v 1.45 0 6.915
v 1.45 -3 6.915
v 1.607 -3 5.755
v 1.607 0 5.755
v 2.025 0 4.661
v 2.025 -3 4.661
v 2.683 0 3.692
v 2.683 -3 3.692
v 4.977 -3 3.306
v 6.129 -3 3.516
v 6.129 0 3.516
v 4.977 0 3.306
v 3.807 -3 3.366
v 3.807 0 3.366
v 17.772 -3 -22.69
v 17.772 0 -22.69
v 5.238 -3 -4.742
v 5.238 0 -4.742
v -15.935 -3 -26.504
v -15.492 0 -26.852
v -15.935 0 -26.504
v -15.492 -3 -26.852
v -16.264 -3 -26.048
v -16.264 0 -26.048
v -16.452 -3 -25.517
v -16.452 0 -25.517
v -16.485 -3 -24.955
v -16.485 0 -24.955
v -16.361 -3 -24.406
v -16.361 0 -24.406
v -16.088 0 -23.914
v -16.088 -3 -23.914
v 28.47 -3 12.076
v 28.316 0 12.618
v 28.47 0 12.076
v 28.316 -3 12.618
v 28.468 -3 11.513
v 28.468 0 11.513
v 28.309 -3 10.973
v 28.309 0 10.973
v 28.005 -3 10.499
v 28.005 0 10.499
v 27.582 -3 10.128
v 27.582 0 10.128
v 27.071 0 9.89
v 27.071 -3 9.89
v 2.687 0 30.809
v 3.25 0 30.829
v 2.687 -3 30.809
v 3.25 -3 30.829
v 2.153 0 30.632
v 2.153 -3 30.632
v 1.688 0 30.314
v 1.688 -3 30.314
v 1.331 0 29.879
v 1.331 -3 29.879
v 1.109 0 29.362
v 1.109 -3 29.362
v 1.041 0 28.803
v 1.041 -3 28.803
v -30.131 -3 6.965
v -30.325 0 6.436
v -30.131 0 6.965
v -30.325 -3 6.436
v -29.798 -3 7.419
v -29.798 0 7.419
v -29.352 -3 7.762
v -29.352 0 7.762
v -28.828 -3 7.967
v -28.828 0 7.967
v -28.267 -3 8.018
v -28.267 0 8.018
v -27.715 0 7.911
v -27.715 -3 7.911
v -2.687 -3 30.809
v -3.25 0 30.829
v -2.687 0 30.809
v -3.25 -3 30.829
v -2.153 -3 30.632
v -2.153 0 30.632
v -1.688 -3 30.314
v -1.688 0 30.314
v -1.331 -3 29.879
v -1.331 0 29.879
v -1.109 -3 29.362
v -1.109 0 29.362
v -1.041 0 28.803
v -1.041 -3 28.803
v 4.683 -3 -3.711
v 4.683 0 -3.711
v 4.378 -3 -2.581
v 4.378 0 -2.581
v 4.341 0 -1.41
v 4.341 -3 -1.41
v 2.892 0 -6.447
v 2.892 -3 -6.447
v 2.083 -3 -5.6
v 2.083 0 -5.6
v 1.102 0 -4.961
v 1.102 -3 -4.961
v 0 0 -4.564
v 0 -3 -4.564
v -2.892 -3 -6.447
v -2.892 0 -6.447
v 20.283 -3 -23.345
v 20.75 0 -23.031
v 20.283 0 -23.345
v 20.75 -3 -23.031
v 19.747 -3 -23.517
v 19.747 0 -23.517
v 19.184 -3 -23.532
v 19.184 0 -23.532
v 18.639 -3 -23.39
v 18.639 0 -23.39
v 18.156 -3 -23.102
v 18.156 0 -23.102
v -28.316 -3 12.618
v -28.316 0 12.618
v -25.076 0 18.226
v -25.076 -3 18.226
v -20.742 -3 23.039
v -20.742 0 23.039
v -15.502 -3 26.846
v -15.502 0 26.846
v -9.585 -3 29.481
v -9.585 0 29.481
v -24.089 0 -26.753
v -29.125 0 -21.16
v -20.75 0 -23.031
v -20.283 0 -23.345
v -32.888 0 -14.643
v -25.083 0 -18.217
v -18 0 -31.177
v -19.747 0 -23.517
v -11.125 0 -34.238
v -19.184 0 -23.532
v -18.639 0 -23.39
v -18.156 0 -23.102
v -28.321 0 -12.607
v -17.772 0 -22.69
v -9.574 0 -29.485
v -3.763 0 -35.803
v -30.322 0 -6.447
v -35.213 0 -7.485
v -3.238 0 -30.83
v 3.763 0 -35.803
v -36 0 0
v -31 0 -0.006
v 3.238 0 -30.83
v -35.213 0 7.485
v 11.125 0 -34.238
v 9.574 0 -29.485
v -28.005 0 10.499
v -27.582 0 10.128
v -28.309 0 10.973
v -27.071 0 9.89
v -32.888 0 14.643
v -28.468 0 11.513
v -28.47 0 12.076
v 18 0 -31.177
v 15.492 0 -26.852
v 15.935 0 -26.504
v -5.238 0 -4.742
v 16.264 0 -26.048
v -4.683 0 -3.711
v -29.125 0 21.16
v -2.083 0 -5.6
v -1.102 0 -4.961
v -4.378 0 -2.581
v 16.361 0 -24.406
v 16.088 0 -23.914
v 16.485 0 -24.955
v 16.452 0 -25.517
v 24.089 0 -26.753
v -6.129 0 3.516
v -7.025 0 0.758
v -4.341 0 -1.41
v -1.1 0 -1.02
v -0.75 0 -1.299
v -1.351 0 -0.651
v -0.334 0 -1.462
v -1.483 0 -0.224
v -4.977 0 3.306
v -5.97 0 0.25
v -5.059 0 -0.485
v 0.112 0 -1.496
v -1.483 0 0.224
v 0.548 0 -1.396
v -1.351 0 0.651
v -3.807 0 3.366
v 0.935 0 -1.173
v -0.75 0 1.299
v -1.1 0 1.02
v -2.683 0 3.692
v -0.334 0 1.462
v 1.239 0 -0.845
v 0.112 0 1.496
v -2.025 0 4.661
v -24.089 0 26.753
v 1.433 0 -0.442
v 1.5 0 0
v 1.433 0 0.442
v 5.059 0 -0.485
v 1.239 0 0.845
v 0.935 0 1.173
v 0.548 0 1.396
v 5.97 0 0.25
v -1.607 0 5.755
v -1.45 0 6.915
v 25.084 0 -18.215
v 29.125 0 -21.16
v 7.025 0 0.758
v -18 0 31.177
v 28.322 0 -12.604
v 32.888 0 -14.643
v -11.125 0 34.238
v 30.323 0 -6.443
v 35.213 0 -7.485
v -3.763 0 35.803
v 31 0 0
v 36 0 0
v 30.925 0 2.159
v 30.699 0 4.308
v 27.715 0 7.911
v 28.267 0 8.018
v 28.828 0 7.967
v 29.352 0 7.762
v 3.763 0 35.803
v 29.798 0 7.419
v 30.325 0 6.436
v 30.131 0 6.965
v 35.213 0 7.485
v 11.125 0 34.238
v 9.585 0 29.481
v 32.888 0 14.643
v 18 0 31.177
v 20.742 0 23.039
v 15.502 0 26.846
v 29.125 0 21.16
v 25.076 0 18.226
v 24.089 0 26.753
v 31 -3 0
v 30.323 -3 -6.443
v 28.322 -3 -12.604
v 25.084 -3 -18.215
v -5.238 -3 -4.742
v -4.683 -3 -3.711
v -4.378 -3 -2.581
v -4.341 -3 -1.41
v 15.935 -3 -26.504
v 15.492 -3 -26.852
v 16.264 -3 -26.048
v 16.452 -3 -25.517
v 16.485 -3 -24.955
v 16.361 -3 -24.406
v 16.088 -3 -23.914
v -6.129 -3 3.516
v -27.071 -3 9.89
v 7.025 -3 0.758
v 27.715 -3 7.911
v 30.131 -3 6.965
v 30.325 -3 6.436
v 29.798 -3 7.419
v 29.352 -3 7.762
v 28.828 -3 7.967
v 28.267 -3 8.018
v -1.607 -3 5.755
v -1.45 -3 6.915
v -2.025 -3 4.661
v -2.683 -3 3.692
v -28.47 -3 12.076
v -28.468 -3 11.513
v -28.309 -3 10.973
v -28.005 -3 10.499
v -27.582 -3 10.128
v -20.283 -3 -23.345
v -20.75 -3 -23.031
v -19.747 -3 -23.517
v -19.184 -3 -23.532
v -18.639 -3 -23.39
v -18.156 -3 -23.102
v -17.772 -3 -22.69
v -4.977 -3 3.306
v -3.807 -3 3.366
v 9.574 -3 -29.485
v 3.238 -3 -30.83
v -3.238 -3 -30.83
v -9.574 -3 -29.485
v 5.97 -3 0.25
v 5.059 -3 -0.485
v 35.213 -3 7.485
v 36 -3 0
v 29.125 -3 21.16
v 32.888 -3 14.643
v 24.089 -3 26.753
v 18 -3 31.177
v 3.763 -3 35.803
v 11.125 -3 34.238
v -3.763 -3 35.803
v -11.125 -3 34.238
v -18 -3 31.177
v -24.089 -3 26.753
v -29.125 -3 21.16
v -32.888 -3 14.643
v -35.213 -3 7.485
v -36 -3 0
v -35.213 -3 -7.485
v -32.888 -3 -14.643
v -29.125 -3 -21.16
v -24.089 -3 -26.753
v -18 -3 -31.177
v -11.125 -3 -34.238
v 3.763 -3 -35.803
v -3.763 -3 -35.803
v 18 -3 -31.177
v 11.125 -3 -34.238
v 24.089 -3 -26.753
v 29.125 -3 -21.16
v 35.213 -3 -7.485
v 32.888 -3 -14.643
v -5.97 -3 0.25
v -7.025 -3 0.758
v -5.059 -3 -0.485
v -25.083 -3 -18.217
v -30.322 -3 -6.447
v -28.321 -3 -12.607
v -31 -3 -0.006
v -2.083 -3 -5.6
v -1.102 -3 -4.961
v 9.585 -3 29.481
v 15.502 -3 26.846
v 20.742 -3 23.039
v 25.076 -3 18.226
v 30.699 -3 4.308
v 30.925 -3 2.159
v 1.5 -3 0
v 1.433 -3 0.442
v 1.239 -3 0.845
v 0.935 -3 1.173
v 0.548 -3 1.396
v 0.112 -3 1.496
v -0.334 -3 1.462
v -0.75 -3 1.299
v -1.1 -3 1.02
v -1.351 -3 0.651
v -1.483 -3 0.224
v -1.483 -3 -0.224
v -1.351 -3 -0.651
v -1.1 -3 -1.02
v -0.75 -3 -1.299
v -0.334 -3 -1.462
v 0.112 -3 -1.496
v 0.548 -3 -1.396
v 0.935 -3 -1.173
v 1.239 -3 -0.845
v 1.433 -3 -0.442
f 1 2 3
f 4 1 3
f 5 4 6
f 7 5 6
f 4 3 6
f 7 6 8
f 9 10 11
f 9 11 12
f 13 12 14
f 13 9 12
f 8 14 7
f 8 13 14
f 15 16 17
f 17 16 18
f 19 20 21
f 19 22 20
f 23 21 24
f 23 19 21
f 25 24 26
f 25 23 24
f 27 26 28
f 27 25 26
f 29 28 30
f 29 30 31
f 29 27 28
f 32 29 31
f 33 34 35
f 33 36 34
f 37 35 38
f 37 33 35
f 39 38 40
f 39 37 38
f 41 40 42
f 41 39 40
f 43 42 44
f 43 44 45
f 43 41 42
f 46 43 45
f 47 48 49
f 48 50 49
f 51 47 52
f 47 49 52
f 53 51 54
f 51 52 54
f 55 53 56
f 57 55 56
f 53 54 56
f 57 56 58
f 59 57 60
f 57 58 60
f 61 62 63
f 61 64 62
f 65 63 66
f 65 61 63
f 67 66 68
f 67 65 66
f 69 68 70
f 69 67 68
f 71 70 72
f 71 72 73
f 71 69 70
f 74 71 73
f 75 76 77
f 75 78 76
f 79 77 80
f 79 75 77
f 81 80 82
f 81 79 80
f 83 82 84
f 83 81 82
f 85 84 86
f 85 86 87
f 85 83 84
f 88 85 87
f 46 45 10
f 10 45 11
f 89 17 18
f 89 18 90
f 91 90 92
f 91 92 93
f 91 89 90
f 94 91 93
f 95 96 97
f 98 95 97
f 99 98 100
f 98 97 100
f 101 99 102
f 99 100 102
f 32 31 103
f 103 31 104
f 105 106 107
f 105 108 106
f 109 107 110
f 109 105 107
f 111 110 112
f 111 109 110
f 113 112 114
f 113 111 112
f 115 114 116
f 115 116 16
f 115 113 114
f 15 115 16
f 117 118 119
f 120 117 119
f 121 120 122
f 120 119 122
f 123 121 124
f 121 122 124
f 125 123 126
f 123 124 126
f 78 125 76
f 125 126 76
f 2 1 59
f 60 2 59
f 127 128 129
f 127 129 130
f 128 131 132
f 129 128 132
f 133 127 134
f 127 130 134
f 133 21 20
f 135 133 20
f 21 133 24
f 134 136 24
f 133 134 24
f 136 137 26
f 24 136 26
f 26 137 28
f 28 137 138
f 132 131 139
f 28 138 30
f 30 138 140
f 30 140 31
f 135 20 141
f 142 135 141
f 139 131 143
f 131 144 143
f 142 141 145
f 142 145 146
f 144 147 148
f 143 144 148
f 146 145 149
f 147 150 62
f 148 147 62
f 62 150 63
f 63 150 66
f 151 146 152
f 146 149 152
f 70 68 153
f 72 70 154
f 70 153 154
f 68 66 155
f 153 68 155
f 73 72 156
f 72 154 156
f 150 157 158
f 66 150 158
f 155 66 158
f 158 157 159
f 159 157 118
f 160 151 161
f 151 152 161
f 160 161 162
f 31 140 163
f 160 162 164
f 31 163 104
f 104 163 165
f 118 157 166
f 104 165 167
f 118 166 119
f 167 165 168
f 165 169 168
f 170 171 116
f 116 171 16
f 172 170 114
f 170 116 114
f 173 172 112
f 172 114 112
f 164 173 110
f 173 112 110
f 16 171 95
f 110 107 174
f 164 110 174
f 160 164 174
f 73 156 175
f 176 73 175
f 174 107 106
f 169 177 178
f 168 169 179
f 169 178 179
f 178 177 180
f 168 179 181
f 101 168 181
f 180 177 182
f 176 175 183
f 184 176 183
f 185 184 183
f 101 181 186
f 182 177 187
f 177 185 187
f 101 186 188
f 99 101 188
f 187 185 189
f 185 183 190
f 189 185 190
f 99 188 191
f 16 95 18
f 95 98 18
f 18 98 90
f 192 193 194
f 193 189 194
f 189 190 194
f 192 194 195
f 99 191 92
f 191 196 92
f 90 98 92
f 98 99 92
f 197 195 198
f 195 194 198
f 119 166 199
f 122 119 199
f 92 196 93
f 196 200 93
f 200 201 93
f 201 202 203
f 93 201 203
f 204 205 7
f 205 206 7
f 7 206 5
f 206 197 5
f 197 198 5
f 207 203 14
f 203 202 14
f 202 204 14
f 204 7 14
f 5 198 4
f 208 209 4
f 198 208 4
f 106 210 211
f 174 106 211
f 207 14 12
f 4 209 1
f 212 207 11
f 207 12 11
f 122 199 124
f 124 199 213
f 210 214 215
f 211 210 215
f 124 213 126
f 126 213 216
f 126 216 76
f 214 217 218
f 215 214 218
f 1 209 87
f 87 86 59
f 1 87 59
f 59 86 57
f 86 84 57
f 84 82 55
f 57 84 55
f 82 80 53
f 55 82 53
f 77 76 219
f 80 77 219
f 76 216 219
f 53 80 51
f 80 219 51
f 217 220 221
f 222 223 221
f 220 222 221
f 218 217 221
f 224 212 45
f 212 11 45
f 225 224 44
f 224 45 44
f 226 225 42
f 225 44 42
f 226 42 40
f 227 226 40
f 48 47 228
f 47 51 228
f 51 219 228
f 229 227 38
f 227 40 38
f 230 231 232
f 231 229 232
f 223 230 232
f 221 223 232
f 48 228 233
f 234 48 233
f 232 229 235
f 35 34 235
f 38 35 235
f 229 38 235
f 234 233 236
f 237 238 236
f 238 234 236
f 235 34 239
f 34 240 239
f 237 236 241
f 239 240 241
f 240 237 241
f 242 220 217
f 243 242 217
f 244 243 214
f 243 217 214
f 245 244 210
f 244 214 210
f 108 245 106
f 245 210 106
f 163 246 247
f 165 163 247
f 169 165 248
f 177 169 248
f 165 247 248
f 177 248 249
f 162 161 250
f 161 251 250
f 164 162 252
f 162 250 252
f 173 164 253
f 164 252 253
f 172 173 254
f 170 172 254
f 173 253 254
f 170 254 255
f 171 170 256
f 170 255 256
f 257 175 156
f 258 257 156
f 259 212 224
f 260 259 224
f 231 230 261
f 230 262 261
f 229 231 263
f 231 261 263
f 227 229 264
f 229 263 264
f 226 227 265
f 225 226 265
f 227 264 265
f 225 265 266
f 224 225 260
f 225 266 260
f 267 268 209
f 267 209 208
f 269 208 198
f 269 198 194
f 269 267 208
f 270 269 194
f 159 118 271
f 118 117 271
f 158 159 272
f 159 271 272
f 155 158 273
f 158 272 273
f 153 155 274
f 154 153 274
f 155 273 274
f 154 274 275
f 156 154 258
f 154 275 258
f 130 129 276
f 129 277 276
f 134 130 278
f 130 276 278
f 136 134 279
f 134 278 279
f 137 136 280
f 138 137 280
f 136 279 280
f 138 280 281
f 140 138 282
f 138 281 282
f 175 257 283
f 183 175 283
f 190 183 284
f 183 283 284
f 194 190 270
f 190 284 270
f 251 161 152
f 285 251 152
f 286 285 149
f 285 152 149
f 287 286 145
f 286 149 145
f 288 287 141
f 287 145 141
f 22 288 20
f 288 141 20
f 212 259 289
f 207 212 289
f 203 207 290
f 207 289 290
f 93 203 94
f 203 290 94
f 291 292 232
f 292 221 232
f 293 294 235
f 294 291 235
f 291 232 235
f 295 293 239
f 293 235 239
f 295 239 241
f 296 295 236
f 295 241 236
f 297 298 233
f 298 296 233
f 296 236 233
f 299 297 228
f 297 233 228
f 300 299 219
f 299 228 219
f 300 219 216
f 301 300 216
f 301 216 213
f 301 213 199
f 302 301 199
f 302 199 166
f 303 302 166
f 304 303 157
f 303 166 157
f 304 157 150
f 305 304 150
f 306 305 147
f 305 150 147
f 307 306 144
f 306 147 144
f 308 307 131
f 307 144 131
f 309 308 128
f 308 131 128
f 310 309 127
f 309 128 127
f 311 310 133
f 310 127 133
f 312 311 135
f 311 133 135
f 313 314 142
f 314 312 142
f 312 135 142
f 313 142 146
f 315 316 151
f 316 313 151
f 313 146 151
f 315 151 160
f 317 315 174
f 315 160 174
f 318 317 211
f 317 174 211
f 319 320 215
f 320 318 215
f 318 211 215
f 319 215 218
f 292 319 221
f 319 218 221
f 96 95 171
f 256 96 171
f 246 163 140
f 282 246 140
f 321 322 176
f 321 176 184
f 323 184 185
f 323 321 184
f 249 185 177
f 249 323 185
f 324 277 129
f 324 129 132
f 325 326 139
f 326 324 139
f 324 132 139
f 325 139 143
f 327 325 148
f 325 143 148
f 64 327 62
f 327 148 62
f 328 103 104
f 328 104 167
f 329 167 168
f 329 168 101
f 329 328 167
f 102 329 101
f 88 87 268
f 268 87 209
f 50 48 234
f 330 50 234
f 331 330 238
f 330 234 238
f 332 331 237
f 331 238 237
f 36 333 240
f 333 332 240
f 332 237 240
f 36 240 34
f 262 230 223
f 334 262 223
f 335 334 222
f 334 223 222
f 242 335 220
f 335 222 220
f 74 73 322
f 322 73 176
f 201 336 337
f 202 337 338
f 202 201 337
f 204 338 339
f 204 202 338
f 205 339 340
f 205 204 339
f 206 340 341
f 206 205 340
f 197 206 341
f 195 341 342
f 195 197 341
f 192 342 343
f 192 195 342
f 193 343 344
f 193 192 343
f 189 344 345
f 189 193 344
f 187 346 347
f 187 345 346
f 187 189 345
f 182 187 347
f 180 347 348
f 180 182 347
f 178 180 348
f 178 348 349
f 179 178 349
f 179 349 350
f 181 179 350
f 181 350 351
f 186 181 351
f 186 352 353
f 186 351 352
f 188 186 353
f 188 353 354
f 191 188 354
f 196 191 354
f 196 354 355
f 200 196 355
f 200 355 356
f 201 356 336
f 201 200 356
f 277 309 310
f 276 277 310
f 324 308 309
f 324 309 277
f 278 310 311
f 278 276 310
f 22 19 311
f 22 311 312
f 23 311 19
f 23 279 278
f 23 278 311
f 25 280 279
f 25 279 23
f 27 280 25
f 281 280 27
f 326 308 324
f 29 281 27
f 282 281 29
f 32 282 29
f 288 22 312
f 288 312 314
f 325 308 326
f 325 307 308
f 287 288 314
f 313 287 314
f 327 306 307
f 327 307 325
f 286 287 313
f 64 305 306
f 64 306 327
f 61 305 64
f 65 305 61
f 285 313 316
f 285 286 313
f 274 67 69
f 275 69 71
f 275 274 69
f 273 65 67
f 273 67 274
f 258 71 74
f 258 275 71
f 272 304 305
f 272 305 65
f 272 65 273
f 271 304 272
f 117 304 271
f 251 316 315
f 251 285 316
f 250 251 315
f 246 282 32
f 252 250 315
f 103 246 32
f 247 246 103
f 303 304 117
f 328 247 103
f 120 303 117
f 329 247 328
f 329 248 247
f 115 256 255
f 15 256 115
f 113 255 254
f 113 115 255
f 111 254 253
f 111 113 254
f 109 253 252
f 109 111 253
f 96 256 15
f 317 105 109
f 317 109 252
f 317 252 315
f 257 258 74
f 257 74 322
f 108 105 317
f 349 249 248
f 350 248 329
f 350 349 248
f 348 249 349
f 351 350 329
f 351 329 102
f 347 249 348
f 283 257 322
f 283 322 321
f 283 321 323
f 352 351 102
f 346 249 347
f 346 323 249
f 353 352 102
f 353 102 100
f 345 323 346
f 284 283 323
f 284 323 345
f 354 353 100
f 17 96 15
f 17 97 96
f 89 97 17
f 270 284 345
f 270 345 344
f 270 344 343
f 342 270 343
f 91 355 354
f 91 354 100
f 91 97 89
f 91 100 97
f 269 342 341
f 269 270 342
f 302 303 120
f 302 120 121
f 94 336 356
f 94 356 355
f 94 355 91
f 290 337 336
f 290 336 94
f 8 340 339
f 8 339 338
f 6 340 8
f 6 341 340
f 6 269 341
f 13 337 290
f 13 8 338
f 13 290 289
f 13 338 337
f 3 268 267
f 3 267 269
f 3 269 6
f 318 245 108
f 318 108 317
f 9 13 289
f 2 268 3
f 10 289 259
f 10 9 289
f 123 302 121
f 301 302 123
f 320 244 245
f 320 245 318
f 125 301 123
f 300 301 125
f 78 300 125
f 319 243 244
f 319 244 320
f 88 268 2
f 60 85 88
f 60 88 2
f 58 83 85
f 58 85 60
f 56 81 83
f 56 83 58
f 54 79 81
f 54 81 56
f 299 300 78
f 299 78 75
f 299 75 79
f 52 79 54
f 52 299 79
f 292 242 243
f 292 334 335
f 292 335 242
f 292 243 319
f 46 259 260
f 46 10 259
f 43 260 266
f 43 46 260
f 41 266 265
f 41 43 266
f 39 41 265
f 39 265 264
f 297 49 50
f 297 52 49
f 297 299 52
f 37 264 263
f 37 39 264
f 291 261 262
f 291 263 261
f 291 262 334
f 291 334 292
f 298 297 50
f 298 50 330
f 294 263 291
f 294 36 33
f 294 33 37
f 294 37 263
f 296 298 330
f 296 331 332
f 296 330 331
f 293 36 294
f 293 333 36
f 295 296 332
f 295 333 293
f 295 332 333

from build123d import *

# Parameters (mm, degrees)
F0_R     = 36
F0_R_2   = 1.5
F1_DEPTH = 3
F2_R     = 2
F3_R     = 5.08
F4_COUNT = 5


with BuildPart() as f1:
    # F0 (on Front) → F1 (new body)
    with BuildSketch(Plane.XZ):
        Circle(F0_R)
        with BuildLine():
            ThreePointArc((-0.9998699187, 30.9838709677), (0, 31), (0.9998699187, 30.9838709677))
            ThreePointArc((0.9998699187, 30.9838709677), (22.2710121849, 21.5639054037), (31, 0))
            ThreePointArc((31, 0), (-21.5639054037, -22.2710121849), (-0.9998699187, 30.9838709677))
        make_face(mode=Mode.SUBTRACT)
        with BuildLine():
            ThreePointArc((-1.5, 4.2426406871), (0, 4.5), (1.5, 4.2426406871))
            Line((1.5, 4.2426406871), (0.9998699187, 30.9838709677))
            ThreePointArc((0.9998699187, 30.9838709677), (0, 31), (-0.9998699187, 30.9838709677))
            Line((-0.9998699187, 30.9838709677), (-1.5, 4.2426406871))
        make_face()
        with BuildLine():
            ThreePointArc((-1.5, 4.2426406871), (-2.5980762114, -3.6742346142), (4.5, 0))
            ThreePointArc((4.5, 0), (3.6742346142, 2.5980762114), (1.5, 4.2426406871))
            ThreePointArc((1.5, 4.2426406871), (0, 4.5), (-1.5, 4.2426406871))
        make_face()
        Circle(F0_R_2, mode=Mode.SUBTRACT)
    extrude(amount=F1_DEPTH)

    # F2
    f2_edges = [f1.edges().sort_by_distance(p)[0] for p in [
        (0.99987, -1.5, 30.983871),
        (-0.99987, -1.5, 30.983871),
    ]]
    fillet(f2_edges, radius=F2_R)

    # F3
    f3_edges = [f1.edges().sort_by_distance(p)[0] for p in [
        (-1.5, -1.5, 4.242641),
        (1.5, -1.5, 4.242641),
    ]]
    fillet(f3_edges, radius=F3_R)

    # F4: F1 ×5 about axis
    f4_axis = Axis((0, 0, 0), (0, 1, 0))


with BuildPart() as f1_1:
    add(f1.part)
    for i in range(1, F4_COUNT):
        add(f1.part.rotate(f4_axis, i * 360 / F4_COUNT))


solid = f1_1.part
